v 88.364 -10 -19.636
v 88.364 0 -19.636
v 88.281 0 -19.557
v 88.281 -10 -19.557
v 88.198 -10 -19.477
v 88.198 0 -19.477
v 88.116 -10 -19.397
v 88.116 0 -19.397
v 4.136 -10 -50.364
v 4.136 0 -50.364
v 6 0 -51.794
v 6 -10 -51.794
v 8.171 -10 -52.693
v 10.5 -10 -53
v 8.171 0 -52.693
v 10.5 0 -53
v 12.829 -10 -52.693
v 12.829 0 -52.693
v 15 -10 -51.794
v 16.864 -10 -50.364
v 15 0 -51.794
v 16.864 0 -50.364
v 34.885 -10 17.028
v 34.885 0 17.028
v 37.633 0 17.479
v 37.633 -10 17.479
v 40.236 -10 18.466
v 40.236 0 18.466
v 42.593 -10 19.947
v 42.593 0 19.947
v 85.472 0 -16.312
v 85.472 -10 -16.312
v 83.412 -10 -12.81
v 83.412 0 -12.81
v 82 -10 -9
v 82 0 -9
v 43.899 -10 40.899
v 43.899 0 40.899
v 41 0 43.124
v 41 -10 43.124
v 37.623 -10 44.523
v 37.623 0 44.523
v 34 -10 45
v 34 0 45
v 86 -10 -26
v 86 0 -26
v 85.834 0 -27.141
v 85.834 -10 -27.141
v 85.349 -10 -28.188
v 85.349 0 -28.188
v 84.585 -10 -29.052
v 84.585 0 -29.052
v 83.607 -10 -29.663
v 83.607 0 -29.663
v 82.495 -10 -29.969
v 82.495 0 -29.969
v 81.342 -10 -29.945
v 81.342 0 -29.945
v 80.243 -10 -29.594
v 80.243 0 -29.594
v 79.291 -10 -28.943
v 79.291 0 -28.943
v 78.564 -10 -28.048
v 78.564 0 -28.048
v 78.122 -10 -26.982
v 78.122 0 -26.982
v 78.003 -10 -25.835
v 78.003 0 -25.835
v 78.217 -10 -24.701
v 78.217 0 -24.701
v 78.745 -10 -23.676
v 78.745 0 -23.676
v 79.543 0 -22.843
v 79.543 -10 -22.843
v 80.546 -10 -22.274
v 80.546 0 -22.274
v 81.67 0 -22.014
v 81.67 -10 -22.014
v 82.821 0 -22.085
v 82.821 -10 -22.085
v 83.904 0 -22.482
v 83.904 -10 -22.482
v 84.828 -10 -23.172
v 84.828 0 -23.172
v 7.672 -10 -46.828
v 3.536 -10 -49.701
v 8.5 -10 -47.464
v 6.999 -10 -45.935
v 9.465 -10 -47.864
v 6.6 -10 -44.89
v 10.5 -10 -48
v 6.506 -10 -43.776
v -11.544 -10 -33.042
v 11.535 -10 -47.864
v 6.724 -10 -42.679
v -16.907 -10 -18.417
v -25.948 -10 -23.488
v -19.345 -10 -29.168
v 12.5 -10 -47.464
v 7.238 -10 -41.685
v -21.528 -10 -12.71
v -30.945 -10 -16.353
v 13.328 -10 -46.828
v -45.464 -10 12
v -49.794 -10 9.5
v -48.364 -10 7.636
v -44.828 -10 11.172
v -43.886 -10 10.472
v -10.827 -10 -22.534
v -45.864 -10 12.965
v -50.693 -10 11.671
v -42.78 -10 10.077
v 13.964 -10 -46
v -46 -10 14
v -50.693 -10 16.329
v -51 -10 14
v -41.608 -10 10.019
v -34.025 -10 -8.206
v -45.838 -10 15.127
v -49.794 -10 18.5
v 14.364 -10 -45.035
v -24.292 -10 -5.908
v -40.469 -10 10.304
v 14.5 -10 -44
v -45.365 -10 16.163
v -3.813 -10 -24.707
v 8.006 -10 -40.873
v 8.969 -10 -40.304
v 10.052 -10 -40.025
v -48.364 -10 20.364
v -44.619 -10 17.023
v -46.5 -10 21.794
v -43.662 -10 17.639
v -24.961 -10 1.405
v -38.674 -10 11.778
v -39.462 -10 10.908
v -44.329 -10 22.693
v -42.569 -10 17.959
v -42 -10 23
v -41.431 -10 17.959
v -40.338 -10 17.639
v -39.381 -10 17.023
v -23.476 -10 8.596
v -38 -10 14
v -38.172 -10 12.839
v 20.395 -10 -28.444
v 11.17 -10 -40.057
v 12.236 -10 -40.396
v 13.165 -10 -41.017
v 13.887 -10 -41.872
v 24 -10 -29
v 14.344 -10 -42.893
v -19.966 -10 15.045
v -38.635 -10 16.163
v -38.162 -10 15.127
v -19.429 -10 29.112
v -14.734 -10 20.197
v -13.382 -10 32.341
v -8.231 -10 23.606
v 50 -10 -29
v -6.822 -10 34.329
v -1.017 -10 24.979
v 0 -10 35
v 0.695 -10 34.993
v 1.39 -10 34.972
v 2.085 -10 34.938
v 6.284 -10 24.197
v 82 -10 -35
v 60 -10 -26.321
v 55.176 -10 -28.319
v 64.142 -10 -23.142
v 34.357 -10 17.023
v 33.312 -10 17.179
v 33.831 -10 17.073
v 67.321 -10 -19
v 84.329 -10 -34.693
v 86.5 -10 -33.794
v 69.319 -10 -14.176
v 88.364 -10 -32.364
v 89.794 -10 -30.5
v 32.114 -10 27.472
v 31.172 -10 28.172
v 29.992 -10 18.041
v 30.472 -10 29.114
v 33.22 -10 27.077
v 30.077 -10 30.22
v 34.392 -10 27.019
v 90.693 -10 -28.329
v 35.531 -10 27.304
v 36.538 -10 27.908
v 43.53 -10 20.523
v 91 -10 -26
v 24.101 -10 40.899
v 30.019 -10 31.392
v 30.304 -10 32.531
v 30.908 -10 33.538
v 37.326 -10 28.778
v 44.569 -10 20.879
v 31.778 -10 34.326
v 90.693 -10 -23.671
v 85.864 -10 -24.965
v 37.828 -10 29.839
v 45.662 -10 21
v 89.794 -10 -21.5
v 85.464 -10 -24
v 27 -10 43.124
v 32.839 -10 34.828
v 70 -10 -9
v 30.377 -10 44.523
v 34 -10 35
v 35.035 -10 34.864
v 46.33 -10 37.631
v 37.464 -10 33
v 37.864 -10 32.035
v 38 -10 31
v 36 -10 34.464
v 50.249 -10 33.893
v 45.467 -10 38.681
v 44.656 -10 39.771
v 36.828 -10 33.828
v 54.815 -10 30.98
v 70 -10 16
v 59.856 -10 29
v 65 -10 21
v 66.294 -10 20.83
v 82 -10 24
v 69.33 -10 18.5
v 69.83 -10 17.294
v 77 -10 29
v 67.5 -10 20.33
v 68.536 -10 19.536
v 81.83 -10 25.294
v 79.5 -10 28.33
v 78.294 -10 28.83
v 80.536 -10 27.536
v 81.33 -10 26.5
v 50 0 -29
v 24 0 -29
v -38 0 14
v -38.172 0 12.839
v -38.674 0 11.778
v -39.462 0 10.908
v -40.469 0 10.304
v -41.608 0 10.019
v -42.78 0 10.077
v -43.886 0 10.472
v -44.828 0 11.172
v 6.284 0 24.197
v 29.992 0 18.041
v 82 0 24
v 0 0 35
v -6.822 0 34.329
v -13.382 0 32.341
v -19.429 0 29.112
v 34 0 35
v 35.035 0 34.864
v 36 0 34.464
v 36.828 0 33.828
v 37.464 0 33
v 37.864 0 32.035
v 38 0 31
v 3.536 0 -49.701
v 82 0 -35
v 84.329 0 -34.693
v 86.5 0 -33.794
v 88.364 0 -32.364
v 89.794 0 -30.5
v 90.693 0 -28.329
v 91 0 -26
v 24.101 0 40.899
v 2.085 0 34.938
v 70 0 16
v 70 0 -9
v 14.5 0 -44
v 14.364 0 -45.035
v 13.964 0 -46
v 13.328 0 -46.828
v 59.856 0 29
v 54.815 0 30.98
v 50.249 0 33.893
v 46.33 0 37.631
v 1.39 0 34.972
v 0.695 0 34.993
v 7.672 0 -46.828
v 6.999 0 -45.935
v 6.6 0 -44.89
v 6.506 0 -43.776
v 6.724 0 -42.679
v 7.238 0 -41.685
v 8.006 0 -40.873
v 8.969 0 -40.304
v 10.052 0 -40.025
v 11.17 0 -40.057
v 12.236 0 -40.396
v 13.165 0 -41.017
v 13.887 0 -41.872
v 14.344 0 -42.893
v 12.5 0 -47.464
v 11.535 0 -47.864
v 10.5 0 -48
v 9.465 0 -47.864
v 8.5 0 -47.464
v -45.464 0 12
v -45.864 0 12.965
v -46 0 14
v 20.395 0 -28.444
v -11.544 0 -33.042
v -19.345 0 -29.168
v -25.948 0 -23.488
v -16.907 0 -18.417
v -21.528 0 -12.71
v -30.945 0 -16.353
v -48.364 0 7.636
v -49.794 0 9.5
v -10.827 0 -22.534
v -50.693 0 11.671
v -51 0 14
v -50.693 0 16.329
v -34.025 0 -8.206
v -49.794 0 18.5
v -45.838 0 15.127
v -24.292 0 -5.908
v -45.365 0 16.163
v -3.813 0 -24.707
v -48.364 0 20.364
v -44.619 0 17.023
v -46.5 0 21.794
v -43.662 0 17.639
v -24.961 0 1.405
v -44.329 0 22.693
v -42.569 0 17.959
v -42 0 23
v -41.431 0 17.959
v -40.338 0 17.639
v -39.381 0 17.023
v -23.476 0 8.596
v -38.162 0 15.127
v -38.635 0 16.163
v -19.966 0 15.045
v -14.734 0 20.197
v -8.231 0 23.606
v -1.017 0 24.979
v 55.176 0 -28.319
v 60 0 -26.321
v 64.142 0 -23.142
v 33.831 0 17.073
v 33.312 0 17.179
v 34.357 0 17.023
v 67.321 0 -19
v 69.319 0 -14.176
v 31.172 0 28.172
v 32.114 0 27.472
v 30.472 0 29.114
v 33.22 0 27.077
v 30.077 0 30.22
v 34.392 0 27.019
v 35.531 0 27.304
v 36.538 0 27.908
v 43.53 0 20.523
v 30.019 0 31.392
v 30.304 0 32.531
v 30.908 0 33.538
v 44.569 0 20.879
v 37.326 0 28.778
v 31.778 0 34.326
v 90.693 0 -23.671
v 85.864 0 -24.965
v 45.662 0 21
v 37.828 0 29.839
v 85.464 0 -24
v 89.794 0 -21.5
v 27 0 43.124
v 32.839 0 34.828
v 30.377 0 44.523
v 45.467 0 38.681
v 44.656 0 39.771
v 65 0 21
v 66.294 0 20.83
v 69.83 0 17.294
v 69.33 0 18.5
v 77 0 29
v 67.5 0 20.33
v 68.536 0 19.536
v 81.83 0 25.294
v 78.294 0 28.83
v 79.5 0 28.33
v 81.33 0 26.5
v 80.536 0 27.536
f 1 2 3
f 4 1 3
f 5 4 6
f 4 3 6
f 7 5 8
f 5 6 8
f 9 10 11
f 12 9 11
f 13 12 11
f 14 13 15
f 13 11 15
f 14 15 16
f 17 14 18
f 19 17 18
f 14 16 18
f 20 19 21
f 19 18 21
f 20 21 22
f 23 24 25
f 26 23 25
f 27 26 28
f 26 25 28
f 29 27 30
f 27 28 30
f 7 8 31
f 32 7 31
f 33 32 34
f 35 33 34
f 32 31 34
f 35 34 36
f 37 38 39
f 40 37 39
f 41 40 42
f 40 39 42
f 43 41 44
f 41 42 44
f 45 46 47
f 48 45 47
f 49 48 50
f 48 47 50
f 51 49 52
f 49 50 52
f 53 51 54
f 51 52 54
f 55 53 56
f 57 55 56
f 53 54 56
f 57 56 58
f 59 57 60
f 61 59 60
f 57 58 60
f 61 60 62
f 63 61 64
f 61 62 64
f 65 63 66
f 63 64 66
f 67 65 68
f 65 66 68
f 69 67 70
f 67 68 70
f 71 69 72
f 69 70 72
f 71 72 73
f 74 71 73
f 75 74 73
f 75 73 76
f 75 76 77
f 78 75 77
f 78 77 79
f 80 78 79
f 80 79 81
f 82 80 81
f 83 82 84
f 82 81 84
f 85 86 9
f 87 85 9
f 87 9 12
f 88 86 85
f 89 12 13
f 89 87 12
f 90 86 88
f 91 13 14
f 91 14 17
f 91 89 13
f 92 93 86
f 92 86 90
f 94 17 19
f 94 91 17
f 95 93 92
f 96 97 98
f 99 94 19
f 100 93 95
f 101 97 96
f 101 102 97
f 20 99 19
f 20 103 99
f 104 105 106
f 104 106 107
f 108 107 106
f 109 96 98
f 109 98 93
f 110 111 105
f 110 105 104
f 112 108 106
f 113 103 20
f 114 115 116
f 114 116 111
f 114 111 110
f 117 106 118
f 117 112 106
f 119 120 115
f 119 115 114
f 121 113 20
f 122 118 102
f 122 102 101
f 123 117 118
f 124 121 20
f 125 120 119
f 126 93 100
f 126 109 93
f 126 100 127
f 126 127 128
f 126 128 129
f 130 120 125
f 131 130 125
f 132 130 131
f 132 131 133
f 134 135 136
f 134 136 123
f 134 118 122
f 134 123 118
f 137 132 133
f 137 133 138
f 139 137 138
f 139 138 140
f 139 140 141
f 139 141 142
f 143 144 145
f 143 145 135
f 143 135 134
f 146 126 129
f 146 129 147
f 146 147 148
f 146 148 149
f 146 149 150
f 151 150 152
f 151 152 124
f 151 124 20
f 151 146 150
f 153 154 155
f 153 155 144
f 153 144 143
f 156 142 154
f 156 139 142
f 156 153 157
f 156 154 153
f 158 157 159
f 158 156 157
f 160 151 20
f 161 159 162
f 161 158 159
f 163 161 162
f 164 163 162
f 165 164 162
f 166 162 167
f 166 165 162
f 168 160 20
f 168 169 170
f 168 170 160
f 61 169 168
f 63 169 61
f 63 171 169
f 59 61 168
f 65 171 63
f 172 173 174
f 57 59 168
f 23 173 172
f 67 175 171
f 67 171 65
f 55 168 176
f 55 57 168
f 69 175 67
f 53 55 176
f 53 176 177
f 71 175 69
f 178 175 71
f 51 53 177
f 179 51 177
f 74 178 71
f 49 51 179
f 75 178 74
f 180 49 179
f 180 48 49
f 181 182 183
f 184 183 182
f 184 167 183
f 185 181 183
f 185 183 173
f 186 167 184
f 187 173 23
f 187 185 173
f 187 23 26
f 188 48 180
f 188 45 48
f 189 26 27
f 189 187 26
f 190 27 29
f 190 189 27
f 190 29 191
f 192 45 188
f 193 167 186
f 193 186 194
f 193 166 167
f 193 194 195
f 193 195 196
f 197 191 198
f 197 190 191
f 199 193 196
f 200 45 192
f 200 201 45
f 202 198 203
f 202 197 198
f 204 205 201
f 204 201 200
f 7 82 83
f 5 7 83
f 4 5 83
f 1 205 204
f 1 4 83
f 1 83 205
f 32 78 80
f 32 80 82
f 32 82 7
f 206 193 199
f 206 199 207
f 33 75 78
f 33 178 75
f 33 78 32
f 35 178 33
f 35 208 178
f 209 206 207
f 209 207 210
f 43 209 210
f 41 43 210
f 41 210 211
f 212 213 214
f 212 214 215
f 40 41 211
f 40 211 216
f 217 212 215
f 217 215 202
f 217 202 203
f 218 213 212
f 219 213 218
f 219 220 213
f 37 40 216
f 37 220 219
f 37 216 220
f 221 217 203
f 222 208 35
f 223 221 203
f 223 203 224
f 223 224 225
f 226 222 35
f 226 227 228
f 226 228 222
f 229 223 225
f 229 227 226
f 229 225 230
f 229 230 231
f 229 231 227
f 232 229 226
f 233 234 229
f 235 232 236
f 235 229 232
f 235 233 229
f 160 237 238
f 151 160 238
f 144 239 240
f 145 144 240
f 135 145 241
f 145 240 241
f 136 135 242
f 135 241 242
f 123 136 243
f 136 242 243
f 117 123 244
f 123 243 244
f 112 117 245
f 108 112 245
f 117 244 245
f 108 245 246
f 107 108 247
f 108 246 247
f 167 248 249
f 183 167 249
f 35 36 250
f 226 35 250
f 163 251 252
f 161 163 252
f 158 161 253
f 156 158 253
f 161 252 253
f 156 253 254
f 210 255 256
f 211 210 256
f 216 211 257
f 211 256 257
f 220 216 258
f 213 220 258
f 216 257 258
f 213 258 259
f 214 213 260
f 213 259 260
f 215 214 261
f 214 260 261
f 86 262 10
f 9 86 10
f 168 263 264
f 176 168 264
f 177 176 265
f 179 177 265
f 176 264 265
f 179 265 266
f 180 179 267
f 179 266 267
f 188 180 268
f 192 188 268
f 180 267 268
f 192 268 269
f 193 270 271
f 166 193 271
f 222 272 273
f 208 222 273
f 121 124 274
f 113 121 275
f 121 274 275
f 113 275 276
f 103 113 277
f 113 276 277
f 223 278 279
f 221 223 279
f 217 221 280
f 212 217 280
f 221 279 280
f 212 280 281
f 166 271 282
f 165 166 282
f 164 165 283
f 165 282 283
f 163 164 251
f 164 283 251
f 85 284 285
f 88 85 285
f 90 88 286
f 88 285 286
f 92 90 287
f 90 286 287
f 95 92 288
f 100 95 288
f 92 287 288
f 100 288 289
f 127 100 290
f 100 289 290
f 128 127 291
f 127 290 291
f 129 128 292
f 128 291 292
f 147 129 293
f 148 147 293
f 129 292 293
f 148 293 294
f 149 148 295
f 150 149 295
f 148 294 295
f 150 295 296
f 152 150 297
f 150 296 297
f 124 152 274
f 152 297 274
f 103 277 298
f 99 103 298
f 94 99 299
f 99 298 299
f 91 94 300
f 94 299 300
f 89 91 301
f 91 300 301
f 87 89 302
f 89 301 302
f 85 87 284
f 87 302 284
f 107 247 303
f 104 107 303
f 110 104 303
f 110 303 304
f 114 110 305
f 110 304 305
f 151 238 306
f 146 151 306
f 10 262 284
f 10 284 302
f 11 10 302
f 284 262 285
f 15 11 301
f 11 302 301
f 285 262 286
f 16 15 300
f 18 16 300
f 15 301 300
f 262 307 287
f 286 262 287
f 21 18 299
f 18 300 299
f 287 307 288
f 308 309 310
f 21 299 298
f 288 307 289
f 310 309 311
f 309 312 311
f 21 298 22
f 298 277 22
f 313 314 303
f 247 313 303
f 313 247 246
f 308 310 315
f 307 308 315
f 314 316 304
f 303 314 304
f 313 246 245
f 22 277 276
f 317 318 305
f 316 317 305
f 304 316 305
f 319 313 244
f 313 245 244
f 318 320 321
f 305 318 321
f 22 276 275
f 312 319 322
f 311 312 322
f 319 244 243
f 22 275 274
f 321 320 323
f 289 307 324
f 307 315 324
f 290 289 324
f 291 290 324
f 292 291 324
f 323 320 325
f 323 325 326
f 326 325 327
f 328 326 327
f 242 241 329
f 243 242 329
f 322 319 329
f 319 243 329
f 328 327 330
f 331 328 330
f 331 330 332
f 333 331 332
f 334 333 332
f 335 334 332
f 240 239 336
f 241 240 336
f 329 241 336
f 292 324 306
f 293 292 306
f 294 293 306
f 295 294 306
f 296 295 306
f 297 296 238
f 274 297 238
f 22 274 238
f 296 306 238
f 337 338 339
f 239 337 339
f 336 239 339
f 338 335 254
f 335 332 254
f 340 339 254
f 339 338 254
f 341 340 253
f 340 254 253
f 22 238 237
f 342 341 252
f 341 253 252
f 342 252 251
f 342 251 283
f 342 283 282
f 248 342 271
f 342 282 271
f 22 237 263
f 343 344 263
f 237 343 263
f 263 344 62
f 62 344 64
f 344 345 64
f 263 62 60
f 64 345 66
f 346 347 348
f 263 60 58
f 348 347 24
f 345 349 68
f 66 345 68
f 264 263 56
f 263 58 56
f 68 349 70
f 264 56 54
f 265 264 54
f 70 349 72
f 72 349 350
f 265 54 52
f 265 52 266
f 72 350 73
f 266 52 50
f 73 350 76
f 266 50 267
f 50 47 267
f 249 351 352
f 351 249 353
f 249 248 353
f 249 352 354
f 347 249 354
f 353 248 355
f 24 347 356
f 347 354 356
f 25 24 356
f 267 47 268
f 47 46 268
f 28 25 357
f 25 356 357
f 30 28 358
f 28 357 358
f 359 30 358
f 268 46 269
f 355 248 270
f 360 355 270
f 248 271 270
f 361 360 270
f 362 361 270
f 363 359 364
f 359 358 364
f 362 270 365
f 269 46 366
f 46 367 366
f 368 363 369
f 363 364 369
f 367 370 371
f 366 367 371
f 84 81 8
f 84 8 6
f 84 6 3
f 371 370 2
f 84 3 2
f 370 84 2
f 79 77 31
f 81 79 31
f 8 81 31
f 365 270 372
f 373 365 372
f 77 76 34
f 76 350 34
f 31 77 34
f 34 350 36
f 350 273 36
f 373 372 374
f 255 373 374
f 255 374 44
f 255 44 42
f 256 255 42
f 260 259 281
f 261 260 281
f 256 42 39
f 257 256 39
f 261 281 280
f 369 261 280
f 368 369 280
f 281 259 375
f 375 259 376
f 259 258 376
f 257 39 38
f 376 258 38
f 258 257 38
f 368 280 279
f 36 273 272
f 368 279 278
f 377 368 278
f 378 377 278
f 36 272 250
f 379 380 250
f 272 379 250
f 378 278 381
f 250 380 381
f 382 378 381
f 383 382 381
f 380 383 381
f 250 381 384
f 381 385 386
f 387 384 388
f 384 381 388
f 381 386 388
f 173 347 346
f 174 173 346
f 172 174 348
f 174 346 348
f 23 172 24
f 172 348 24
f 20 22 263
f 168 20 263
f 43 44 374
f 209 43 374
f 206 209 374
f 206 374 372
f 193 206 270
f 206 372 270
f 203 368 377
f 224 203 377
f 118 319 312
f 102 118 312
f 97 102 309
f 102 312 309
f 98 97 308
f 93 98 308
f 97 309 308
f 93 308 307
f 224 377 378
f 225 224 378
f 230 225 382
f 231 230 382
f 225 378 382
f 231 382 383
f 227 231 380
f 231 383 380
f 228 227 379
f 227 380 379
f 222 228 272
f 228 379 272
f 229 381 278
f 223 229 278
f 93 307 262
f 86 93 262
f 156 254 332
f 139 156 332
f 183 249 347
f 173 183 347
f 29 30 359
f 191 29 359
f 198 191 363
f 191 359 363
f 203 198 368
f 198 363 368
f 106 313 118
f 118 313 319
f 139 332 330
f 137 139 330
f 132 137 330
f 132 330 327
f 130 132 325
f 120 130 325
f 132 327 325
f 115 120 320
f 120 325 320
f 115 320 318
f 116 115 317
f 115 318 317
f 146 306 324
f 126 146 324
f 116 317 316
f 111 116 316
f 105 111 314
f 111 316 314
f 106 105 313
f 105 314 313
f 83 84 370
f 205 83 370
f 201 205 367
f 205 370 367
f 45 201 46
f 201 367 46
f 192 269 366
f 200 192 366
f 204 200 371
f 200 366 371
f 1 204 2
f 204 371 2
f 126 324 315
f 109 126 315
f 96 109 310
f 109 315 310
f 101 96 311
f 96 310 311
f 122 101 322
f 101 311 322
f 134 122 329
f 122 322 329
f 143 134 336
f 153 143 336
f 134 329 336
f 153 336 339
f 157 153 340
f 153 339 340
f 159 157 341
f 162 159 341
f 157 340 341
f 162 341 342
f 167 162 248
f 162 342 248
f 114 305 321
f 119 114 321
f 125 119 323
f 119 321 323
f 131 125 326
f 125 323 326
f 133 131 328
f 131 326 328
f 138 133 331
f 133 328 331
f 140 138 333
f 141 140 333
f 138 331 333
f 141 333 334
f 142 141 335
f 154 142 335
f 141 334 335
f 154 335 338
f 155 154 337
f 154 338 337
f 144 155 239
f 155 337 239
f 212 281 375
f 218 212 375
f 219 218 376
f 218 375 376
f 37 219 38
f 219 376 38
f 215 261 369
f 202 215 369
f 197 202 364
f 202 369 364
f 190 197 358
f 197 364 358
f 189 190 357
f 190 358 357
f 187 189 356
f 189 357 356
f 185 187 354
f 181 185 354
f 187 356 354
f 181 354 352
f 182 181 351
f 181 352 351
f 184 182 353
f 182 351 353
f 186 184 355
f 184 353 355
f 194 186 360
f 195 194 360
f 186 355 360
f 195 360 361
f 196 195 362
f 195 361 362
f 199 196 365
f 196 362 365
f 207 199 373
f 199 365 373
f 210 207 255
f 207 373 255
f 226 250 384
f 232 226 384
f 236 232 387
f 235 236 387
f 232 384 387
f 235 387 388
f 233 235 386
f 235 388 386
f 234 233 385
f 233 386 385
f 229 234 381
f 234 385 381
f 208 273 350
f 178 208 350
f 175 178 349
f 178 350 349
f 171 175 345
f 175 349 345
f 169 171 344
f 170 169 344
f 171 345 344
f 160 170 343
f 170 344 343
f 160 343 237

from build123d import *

# Parameters (mm, degrees)
F1_DEPTH = 10


with BuildPart() as f1:
    # F0 (on Front) → F1 (new body)
    with BuildSketch(Plane.XZ):
        with BuildLine():
            ThreePointArc((-3.8132029324, -24.7074782889), (-24.4836360039, 5.0548558862), (6.2836346687, 24.197436545))
            Line((6.2836346687, 24.197436545), (29.9921837161, 18.0407570777))
            ThreePointArc((29.9921837161, 18.0407570777), (25.6485360936, 23.8149658042), (20.2117633339, 28.5741950531))
            ThreePointArc((20.2117633339, 28.5741950531), (13.4284415586, 32.3214627965), (5.9867921367, 34.48417492))
            ThreePointArc((5.9867921367, 34.48417492), (3.7099457558, 34.537913127), (1.4437370332, 34.7642210193))
            Line((1.4437370332, 34.7642210193), (-19.4291119296, 29.1120183022))
            ThreePointArc((-19.4291119296, 29.1120183022), (-22.058033075, 27.1743109731), (-24.4948974278, 25))
            ThreePointArc((-24.4948974278, 25), (-32.6951149804, 12.4911751417), (-34.924423398, -2.298836732))
            ThreePointArc((-34.924423398, -2.298836732), (-34.3740398023, -4.617901554), (-34.292856399, -7))
            ThreePointArc((-34.292856399, -7), (-34.1640037989, -7.6040018691), (-34.0245137483, -8.2056361236))
            Line((-34.0245137483, -8.2056361236), (-11.5437640984, -33.0415119273))
            ThreePointArc((-11.5437640984, -33.0415119273), (-5.8543608765, -34.506904508), (0, -35))
            ThreePointArc((0, -35), (10.7115040799, -33.3206194472), (20.3950829231, -28.4436388769))
            Line((20.3950829231, -28.4436388769), (-3.8132029324, -24.7074782889))
        make_face()
        with BuildLine():
            ThreePointArc((-34.924423398, -2.298836732), (-32.6951149804, 12.4911751417), (-24.4948974278, 25))
            ThreePointArc((-24.4948974278, 25), (-30.9315093384, 22.3189567832), (-37.8973419055, 22.0105053873))
            ThreePointArc((-37.8973419055, 22.0105053873), (-34.3213307517, 18.6944689343), (-33, 14))
            ThreePointArc((-33, 14), (-35.6360389693, 7.6360389693), (-42, 5))
            ThreePointArc((-42, 5), (-37.6511624472, 2.1368221432), (-34.924423398, -2.298836732))
        make_face()
        with BuildLine():
            Line((-48.3639610307, 7.6360389693), (-34.0245137483, -8.2056361236))
            ThreePointArc((-34.0245137483, -8.2056361236), (-34.1640037989, -7.6040018691), (-34.292856399, -7))
            ThreePointArc((-34.292856399, -7), (-34.6883725424, -4.6601298652), (-34.924423398, -2.298836732))
            ThreePointArc((-34.924423398, -2.298836732), (-37.6511624472, 2.1368221432), (-42, 5))
            ThreePointArc((-42, 5), (-45.4441508913, 5.6850842074), (-48.3639610307, 7.6360389693))
        make_face()
        with BuildLine():
            ThreePointArc((-24.4948974278, 25), (-22.058033075, 27.1743109731), (-19.4291119296, 29.1120183022))
            Line((-19.4291119296, 29.1120183022), (-42, 23))
            ThreePointArc((-42, 23), (-39.8898517215, 22.7491299135), (-37.8973419055, 22.0105053873))
            ThreePointArc((-37.8973419055, 22.0105053873), (-30.9315093384, 22.3189567832), (-24.4948974278, 25))
        make_face()
        with BuildLine():
            Line((-44.8284271247, 11.1715728753), (-48.3639610307, 7.6360389693))
            ThreePointArc((-48.3639610307, 7.6360389693), (-45.4441508913, 5.6850842074), (-42, 5))
            ThreePointArc((-42, 5), (-35.6360389693, 7.6360389693), (-33, 14))
            ThreePointArc((-33, 14), (-34.3213307517, 18.6944689343), (-37.8973419055, 22.0105053873))
            ThreePointArc((-37.8973419055, 22.0105053873), (-39.9748437487, 22.3967346363), (-42, 23))
            ThreePointArc((-42, 23), (-48.3639610307, 20.3639610307), (-51, 14))
            Line((-51, 14), (-46, 14))
            ThreePointArc((-46, 14), (-42, 18), (-38, 14))
            ThreePointArc((-38, 14), (-40.4692662705, 10.30448187), (-44.8284271247, 11.1715728753))
        make_face()
        with BuildLine():
            ThreePointArc((-51, 14), (-50.3149157926, 10.5558491087), (-48.3639610307, 7.6360389693))
            Line((-48.3639610307, 7.6360389693), (-44.8284271247, 11.1715728753))
            ThreePointArc((-44.8284271247, 11.1715728753), (-45.69551813, 12.4692662705), (-46, 14))
            Line((-46, 14), (-51, 14))
        make_face()
        with BuildLine():
            ThreePointArc((-37.8973419055, 22.0105053873), (-39.8898517215, 22.7491299135), (-42, 23))
            ThreePointArc((-42, 23), (-39.9748437487, 22.3967346363), (-37.8973419055, 22.0105053873))
        make_face()
        with BuildLine():
            ThreePointArc((-34.0245137483, -8.2056361236), (-25.9484521352, -23.4878230534), (-11.5437640984, -33.0415119273))
            Line((-11.5437640984, -33.0415119273), (-34.0245137483, -8.2056361236))
        make_face()
        with BuildLine():
            ThreePointArc((25.5, -35), (21.1329938541, -37.8036590333), (19.4051952997, -42.6971198545))
            ThreePointArc((19.4051952997, -42.6971198545), (19.4762675344, -43.3468375767), (19.5, -44))
            ThreePointArc((19.5, -44), (18.8149157926, -47.4441508913), (16.8639610307, -50.3639610307))
            Line((16.8639610307, -50.3639610307), (82, -35))
            Line((82, -35), (25.5, -35))
        make_face()
        with BuildLine():
            ThreePointArc((10.5, -35), (5.0043375198, -36.8727499059), (1.7957864602, -41.711623577))
            ThreePointArc((1.7957864602, -41.711623577), (1.7030233208, -42.8629376854), (1.5, -44))
            ThreePointArc((1.5, -44), (2.0241485384, -47.0265396083), (3.5355426668, -49.7005555918))
            Line((3.5355426668, -49.7005555918), (4.1360389693, -50.3639610307))
            Line((4.1360389693, -50.3639610307), (7.6715728753, -46.8284271247))
            ThreePointArc((7.6715728753, -46.8284271247), (8.9692662705, -40.30448187), (14.5, -44))
            ThreePointArc((14.5, -44), (14.19551813, -45.5307337295), (13.3284271247, -46.8284271247))
            Line((13.3284271247, -46.8284271247), (16.8639610307, -50.3639610307))
            ThreePointArc((16.8639610307, -50.3639610307), (18.8149157926, -47.4441508913), (19.5, -44))
            ThreePointArc((19.5, -44), (19.4259596727, -43.3504982525), (19.4051952997, -42.6971198545))
            ThreePointArc((19.4051952997, -42.6971198545), (16.3853240646, -37.190964778), (10.5, -35))
        make_face()
        with BuildLine():
            Line((25.5, -35), (10.5, -35))
            ThreePointArc((10.5, -35), (16.3853240646, -37.190964778), (19.4051952997, -42.6971198545))
            ThreePointArc((19.4051952997, -42.6971198545), (21.1329938541, -37.8036590333), (25.5, -35))
        make_face()
        with BuildLine():
            Line((7.6715728753, -46.8284271247), (4.1360389693, -50.3639610307))
            ThreePointArc((4.1360389693, -50.3639610307), (10.5, -53), (16.8639610307, -50.3639610307))
            Line((16.8639610307, -50.3639610307), (13.3284271247, -46.8284271247))
            ThreePointArc((13.3284271247, -46.8284271247), (10.5, -48), (7.6715728753, -46.8284271247))
        make_face()
        with BuildLine():
            ThreePointArc((1.7957864602, -41.711623577), (1.3942537218, -38.2230037667), (0, -35))
            ThreePointArc((0, -35), (-5.8543608765, -34.506904508), (-11.5437640984, -33.0415119273))
            Line((-11.5437640984, -33.0415119273), (3.5355426668, -49.7005555918))
            ThreePointArc((3.5355426668, -49.7005555918), (2.0241485384, -47.0265396083), (1.5, -44))
            ThreePointArc((1.5, -44), (1.5742529204, -42.8462933341), (1.7957864602, -41.711623577))
        make_face()
        with BuildLine():
            ThreePointArc((1.5, -44), (1.7030233208, -42.8629376854), (1.7957864602, -41.711623577))
            ThreePointArc((1.7957864602, -41.711623577), (1.5742529204, -42.8462933341), (1.5, -44))
        make_face()
        with BuildLine():
            Line((70, 16), (70, 0))
            Line((70, 0), (70, -9))
            ThreePointArc((70, -9), (64.1421356237, -23.1421356237), (50, -29))
            Line((50, -29), (24, -29))
            Line((24, -29), (20.3950829231, -28.4436388769))
            ThreePointArc((20.3950829231, -28.4436388769), (10.7115040799, -33.3206194472), (0, -35))
            ThreePointArc((0, -35), (1.3942537218, -38.2230037667), (1.7957864602, -41.711623577))
            ThreePointArc((1.7957864602, -41.711623577), (5.0043375198, -36.8727499059), (10.5, -35))
            Line((10.5, -35), (25.5, -35))
            Line((25.5, -35), (82, -35))
            ThreePointArc((82, -35), (73, -26), (82, -17))
            Line((82, -17), (82, -9))
            Line((82, -9), (82, 21))
            Line((82, 21), (82, 24))
            ThreePointArc((82, 24), (80.5355339059, 27.5355339059), (77, 29))
            Line((77, 29), (59.8564064606, 29))
            Line((59.8564064606, 29), (47.8564064606, 29))
            ThreePointArc((47.8564064606, 29), (46.4852813742, 24.666142644), (43.7979589711, 21))
            Line((43.7979589711, 21), (45.6619037897, 21))
            Line((45.6619037897, 21), (65, 21))
            ThreePointArc((65, 21), (68.5355339059, 19.5355339059), (70, 16))
        make_face()
        with BuildLine():
            ThreePointArc((20.2117633339, 28.5741950531), (25.6485360936, 23.8149658042), (29.9921837161, 18.0407570777))
            Line((29.9921837161, 18.0407570777), (33.3124983235, 17.1785316953))
            ThreePointArc((33.3124983235, 17.1785316953), (34.0929969479, 17.0407500145), (34.8854615113, 17.0280295623))
            ThreePointArc((34.8854615113, 17.0280295623), (38.9589168635, 17.9076685216), (42.5929817398, 19.9473684211))
            ThreePointArc((42.5929817398, 19.9473684211), (43.210520255, 20.4564561635), (43.7979589711, 21))
            ThreePointArc((43.7979589711, 21), (46.4852813742, 24.666142644), (47.8564064606, 29))
            ThreePointArc((47.8564064606, 29), (47.7860358491, 33.4382812734), (46.3297963636, 37.6314494368))
            ThreePointArc((46.3297963636, 37.6314494368), (45.0551489787, 39.221227134), (43.8994949366, 40.8994949366))
            ThreePointArc((43.8994949366, 40.8994949366), (39.3575680531, 43.9343134552), (34, 45))
            ThreePointArc((34, 45), (28.6424319469, 43.9343134552), (24.1005050634, 40.8994949366))
            ThreePointArc((24.1005050634, 40.8994949366), (20.6487674193, 35.2124326197), (20.2117633339, 28.5741950531))
        make_face()
        with BuildLine():
            ThreePointArc((38, 31), (31.1715728753, 28.1715728753), (34, 35))
            ThreePointArc((34, 35), (36.8284271247, 33.8284271247), (38, 31))
        make_face(mode=Mode.SUBTRACT)
        with BuildLine():
            ThreePointArc((5.9867921367, 34.48417492), (13.4284415586, 32.3214627965), (20.2117633339, 28.5741950531))
            ThreePointArc((20.2117633339, 28.5741950531), (20.6487674193, 35.2124326197), (24.1005050634, 40.8994949366))
            ThreePointArc((24.1005050634, 40.8994949366), (15.5712017516, 36.202283929), (5.9867921367, 34.48417492))
        make_face()
        with BuildLine():
            ThreePointArc((2.0849141286, 34.9378467149), (4.0422227837, 34.7657940362), (5.9867921367, 34.48417492))
            ThreePointArc((5.9867921367, 34.48417492), (15.5712017516, 36.202283929), (24.1005050634, 40.8994949366))
            Line((24.1005050634, 40.8994949366), (2.0849141286, 34.9378467149))
        make_face()
        with BuildLine():
            Line((-19.4291119296, 29.1120183022), (1.4437370332, 34.7642210193))
            ThreePointArc((1.4437370332, 34.7642210193), (0.7204311681, 34.8733092449), (0, 35))
            ThreePointArc((0, 35), (-10.1508462559, 33.4956761432), (-19.4291119296, 29.1120183022))
        make_face()
        with BuildLine():
            ThreePointArc((46.3297963636, 37.6314494368), (47.7860358491, 33.4382812734), (47.8564064606, 29))
            Line((47.8564064606, 29), (59.8564064606, 29))
            ThreePointArc((59.8564064606, 29), (52.4615601585, 32.3260169804), (46.3297963636, 37.6314494368))
        make_face()
        with BuildLine():
            ThreePointArc((82, -17), (73, -26), (82, -35))
            ThreePointArc((82, -35), (88.3639610307, -32.3639610307), (91, -26))
            ThreePointArc((91, -26), (90.3149157926, -22.5558491087), (88.3639610307, -19.6360389693))
            ThreePointArc((88.3639610307, -19.6360389693), (88.2394582184, -19.5171057842), (88.1158492341, -19.3972438978))
            ThreePointArc((88.1158492341, -19.3972438978), (85.2844478288, -17.6207158743), (82, -17))
        make_face()
        with BuildLine():
            ThreePointArc((86, -26), (78.30448187, -27.5307337295), (84.8284271247, -23.1715728753))
            ThreePointArc((84.8284271247, -23.1715728753), (85.69551813, -24.4692662705), (86, -26))
        make_face(mode=Mode.SUBTRACT)
        with BuildLine():
            Line((82, -9), (82, -17))
            ThreePointArc((82, -17), (85.2844478288, -17.6207158743), (88.1158492341, -19.3972438978))
            ThreePointArc((88.1158492341, -19.3972438978), (84.3641673141, -14.6067026972), (82, -9))
        make_face()
        with BuildLine():
            ThreePointArc((1.4437370332, 34.7642210193), (3.7099457558, 34.537913127), (5.9867921367, 34.48417492))
            ThreePointArc((5.9867921367, 34.48417492), (4.0422227837, 34.7657940362), (2.0849141286, 34.9378467149))
            Line((2.0849141286, 34.9378467149), (1.4437370332, 34.7642210193))
        make_face()
        with BuildLine():
            Line((1.4437370332, 34.7642210193), (2.0849141286, 34.9378467149))
            ThreePointArc((2.0849141286, 34.9378467149), (1.0429201737, 34.9844582281), (0, 35))
            ThreePointArc((0, 35), (0.7204311681, 34.8733092449), (1.4437370332, 34.7642210193))
        make_face()
        with BuildLine():
            ThreePointArc((-34.924423398, -2.298836732), (-34.6883725424, -4.6601298652), (-34.292856399, -7))
            ThreePointArc((-34.292856399, -7), (-34.3740398023, -4.617901554), (-34.924423398, -2.298836732))
        make_face()
        with BuildLine():
            ThreePointArc((19.5, -44), (19.4762675344, -43.3468375767), (19.4051952997, -42.6971198545))
            ThreePointArc((19.4051952997, -42.6971198545), (19.4259596727, -43.3504982525), (19.5, -44))
        make_face()
        with BuildLine():
            ThreePointArc((42.5929817398, 19.9473684211), (44.0396895784, 20.7295265146), (45.6619037897, 21))
            Line((45.6619037897, 21), (43.7979589711, 21))
            ThreePointArc((43.7979589711, 21), (43.210520255, 20.4564561635), (42.5929817398, 19.9473684211))
        make_face()
    extrude(amount=F1_DEPTH)


solid = f1.part
